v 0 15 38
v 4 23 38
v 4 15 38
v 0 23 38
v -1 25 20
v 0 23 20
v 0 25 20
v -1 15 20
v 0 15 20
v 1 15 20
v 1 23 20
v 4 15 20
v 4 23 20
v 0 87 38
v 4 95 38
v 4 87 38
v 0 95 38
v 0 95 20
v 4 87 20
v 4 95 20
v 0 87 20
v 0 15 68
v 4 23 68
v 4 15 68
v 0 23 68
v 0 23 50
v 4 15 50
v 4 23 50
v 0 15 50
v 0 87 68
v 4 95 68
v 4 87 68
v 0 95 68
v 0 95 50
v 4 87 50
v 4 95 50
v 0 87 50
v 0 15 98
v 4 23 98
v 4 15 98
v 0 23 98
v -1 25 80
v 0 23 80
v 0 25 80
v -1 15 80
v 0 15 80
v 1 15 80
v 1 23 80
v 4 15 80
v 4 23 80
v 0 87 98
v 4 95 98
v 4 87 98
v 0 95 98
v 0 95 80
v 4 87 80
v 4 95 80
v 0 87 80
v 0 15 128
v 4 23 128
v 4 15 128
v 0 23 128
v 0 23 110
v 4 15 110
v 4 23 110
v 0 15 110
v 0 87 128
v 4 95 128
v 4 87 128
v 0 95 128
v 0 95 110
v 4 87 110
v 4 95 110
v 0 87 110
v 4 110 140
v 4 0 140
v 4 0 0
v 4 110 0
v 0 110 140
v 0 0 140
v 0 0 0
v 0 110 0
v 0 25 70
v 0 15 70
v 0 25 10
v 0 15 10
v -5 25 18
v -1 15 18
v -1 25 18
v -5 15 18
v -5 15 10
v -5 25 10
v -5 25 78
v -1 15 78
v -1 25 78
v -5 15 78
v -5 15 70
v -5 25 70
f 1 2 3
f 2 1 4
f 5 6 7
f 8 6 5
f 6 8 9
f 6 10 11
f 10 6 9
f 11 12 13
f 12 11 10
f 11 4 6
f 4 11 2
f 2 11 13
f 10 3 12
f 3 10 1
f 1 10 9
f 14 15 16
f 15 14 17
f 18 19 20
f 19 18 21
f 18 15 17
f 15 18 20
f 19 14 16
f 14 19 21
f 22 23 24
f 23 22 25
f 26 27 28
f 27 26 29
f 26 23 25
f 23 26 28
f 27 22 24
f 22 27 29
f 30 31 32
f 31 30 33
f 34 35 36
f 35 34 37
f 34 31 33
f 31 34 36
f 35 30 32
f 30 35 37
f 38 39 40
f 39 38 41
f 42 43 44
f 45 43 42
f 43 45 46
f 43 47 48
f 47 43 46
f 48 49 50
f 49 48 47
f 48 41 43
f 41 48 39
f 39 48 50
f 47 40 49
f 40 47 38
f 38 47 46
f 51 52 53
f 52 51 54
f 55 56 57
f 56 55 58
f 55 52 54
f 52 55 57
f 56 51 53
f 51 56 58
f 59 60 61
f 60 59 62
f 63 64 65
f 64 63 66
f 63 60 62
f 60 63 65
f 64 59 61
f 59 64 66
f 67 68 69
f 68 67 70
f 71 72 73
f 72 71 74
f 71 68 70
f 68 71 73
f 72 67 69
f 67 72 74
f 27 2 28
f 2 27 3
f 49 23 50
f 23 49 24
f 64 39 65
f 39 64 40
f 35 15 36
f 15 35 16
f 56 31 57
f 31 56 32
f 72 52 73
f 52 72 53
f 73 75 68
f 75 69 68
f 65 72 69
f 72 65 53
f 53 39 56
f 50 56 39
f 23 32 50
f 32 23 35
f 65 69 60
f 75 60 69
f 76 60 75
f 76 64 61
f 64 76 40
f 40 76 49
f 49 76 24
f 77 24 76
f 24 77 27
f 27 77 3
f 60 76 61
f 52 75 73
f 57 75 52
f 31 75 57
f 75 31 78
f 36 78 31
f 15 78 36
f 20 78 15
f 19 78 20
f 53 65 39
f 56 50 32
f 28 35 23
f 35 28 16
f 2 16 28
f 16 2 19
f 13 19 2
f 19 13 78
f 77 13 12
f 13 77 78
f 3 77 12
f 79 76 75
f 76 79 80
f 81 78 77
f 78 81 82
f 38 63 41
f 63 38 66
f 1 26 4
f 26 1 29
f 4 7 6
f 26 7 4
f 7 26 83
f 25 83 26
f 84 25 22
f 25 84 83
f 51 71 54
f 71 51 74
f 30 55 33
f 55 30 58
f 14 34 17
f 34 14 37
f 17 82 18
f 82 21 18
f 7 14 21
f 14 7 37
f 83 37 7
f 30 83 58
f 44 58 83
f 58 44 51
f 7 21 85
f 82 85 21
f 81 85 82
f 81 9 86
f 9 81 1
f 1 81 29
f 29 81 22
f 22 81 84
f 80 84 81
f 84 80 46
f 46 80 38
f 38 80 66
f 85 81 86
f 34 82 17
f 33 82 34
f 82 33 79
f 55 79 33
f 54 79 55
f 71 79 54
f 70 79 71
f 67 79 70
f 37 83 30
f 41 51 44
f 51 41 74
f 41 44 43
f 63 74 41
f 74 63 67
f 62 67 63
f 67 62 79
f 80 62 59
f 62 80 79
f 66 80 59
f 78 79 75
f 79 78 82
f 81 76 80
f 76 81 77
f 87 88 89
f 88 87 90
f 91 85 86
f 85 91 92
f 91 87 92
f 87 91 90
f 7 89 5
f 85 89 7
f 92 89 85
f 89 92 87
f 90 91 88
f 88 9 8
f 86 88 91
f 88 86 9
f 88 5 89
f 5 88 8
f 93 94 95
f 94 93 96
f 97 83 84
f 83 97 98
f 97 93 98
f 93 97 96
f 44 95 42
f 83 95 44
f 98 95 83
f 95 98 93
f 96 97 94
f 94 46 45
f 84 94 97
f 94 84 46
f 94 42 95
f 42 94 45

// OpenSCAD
// file: ../params/opengrid_params.scad
// ===================================
// OpenGarden - OpenGrid abstraction
// Mechanical Step 2A
// ===================================

// These are placeholder abstraction values.
// Replace with exact OpenGrid dimensions later.

// Grid pitch / spacing assumption
og_pitch                = 20;

// Structural assumptions
og_bar_thickness        = 3;
og_mount_depth          = 8;
og_mount_width          = 20;
og_mount_height         = 40;

// Generic interface plate
og_plate_thickness      = 4;

// Generic hook/tab sizing
og_hook_width           = 10;
og_hook_height          = 8;
og_hook_depth           = 6;

// Generic slot spacing for adapters
og_slot_spacing_x       = 40;
og_slot_spacing_y       = 40;

// Mechanical clearances
og_clearance_loose      = 0.5;
og_clearance_tight      = 0.25;
// file: ../interfaces/opengrid_interface.scad
include <../params/opengrid_params.scad>

// ===================================
// OpenGrid abstraction interface
// Placeholder geometry only
// Replace later with exact OpenGrid geometry
// ===================================

// Generic vertical adapter plate
module og_adapter_plate(
    width = og_mount_width,
    height = og_mount_height,
    thickness = og_plate_thickness
) {
    cube([thickness, width, height], center = false);
}

// Generic slotted mounting face
module og_slotted_face(
    width = 60,
    height = 120,
    thickness = og_plate_thickness
) {
    difference() {
        cube([thickness, width, height], center = false);

        for (y = [20, 60, 100]) {
            translate([-0.5, width/2 - 6, y - 8])
                cube([thickness + 1, 12, 16], center = false);
        }
    }
}

// Generic hook pair placeholder
module og_hook_pair(spacing = 40) {
    union() {
        translate([0, 0, 0]) og_hook();
        translate([0, 0, spacing]) og_hook();
    }
}

module og_hook() {
    union() {
        cube([og_hook_depth, og_hook_width, og_hook_height], center = false);

        translate([og_hook_depth - 2, 0, og_hook_height - 2])
            cube([2, og_hook_width, 4], center = false);
    }
}
// file: ../params/mvp_params.scad
// ===================================
// OpenGarden MVP Parameters
// Carrier + Insert architecture
// ===================================

// ---------- Pot Insert ----------
insert_top_width        = 156;
insert_top_depth        = 156;
insert_bottom_width     = 138;
insert_bottom_depth     = 138;
insert_height           = 145;

insert_wall_thickness   = 2.4;
insert_bottom_thickness = 3.0;

// Top seating flange
insert_flange_width     = 6;
insert_flange_thickness = 3;

// Drainage
drain_hole_diameter     = 8;
drain_hole_offset_x     = 28;
drain_hole_offset_y     = 0;

// Carrier
carrier_outer_width     = 176;
carrier_outer_depth     = 176;
carrier_height          = 160;

carrier_wall_thickness  = 4;
carrier_back_thickness  = 5;
carrier_ledge_width     = 8;
carrier_ledge_height    = 12;

// Sensor
sensor_probe_width      = 14;
sensor_probe_thickness  = 6;
sensor_probe_length     = 70;

sensor_holder_width     = 22;
sensor_holder_thickness = 3;
sensor_holder_height    = 28;
sensor_insert_depth     = 60;

// Tube
tube_outer_diameter     = 6.0;
tube_clip_wall          = 2.4;
tube_clip_width         = 16;
tube_drop_inset         = 18;

// Electronics
electronics_plate_width  = 110;
electronics_plate_height = 140;
electronics_plate_thick  = 4;

// General print
clearance_loose         = 0.4;
clearance_tight         = 0.2;
$fn = 48;
// main file
include <../params/mvp_params.scad>
use <../interfaces/opengrid_interface.scad>

// ===================================
// Electronics Plate
// Separate OpenGrid-mounted dry-zone plate
// ===================================

module plate_body() {
    difference() {
        cube([
            electronics_plate_thick,
            electronics_plate_width,
            electronics_plate_height
        ], center = false);

        // generic board mounting slots
        for (y = [20, 50, 80, 110]) {
            translate([-0.5, 15, y])
                cube([electronics_plate_thick + 1, 8, 18], center = false);

            translate([-0.5, electronics_plate_width - 23, y])
                cube([electronics_plate_thick + 1, 8, 18], center = false);
        }
    }
}

module electronics_plate() {
    union() {
        plate_body();

        translate([-carrier_back_thickness, 15, 10])
            og_hook_pair(spacing = 60);
    }
}

electronics_plate();
